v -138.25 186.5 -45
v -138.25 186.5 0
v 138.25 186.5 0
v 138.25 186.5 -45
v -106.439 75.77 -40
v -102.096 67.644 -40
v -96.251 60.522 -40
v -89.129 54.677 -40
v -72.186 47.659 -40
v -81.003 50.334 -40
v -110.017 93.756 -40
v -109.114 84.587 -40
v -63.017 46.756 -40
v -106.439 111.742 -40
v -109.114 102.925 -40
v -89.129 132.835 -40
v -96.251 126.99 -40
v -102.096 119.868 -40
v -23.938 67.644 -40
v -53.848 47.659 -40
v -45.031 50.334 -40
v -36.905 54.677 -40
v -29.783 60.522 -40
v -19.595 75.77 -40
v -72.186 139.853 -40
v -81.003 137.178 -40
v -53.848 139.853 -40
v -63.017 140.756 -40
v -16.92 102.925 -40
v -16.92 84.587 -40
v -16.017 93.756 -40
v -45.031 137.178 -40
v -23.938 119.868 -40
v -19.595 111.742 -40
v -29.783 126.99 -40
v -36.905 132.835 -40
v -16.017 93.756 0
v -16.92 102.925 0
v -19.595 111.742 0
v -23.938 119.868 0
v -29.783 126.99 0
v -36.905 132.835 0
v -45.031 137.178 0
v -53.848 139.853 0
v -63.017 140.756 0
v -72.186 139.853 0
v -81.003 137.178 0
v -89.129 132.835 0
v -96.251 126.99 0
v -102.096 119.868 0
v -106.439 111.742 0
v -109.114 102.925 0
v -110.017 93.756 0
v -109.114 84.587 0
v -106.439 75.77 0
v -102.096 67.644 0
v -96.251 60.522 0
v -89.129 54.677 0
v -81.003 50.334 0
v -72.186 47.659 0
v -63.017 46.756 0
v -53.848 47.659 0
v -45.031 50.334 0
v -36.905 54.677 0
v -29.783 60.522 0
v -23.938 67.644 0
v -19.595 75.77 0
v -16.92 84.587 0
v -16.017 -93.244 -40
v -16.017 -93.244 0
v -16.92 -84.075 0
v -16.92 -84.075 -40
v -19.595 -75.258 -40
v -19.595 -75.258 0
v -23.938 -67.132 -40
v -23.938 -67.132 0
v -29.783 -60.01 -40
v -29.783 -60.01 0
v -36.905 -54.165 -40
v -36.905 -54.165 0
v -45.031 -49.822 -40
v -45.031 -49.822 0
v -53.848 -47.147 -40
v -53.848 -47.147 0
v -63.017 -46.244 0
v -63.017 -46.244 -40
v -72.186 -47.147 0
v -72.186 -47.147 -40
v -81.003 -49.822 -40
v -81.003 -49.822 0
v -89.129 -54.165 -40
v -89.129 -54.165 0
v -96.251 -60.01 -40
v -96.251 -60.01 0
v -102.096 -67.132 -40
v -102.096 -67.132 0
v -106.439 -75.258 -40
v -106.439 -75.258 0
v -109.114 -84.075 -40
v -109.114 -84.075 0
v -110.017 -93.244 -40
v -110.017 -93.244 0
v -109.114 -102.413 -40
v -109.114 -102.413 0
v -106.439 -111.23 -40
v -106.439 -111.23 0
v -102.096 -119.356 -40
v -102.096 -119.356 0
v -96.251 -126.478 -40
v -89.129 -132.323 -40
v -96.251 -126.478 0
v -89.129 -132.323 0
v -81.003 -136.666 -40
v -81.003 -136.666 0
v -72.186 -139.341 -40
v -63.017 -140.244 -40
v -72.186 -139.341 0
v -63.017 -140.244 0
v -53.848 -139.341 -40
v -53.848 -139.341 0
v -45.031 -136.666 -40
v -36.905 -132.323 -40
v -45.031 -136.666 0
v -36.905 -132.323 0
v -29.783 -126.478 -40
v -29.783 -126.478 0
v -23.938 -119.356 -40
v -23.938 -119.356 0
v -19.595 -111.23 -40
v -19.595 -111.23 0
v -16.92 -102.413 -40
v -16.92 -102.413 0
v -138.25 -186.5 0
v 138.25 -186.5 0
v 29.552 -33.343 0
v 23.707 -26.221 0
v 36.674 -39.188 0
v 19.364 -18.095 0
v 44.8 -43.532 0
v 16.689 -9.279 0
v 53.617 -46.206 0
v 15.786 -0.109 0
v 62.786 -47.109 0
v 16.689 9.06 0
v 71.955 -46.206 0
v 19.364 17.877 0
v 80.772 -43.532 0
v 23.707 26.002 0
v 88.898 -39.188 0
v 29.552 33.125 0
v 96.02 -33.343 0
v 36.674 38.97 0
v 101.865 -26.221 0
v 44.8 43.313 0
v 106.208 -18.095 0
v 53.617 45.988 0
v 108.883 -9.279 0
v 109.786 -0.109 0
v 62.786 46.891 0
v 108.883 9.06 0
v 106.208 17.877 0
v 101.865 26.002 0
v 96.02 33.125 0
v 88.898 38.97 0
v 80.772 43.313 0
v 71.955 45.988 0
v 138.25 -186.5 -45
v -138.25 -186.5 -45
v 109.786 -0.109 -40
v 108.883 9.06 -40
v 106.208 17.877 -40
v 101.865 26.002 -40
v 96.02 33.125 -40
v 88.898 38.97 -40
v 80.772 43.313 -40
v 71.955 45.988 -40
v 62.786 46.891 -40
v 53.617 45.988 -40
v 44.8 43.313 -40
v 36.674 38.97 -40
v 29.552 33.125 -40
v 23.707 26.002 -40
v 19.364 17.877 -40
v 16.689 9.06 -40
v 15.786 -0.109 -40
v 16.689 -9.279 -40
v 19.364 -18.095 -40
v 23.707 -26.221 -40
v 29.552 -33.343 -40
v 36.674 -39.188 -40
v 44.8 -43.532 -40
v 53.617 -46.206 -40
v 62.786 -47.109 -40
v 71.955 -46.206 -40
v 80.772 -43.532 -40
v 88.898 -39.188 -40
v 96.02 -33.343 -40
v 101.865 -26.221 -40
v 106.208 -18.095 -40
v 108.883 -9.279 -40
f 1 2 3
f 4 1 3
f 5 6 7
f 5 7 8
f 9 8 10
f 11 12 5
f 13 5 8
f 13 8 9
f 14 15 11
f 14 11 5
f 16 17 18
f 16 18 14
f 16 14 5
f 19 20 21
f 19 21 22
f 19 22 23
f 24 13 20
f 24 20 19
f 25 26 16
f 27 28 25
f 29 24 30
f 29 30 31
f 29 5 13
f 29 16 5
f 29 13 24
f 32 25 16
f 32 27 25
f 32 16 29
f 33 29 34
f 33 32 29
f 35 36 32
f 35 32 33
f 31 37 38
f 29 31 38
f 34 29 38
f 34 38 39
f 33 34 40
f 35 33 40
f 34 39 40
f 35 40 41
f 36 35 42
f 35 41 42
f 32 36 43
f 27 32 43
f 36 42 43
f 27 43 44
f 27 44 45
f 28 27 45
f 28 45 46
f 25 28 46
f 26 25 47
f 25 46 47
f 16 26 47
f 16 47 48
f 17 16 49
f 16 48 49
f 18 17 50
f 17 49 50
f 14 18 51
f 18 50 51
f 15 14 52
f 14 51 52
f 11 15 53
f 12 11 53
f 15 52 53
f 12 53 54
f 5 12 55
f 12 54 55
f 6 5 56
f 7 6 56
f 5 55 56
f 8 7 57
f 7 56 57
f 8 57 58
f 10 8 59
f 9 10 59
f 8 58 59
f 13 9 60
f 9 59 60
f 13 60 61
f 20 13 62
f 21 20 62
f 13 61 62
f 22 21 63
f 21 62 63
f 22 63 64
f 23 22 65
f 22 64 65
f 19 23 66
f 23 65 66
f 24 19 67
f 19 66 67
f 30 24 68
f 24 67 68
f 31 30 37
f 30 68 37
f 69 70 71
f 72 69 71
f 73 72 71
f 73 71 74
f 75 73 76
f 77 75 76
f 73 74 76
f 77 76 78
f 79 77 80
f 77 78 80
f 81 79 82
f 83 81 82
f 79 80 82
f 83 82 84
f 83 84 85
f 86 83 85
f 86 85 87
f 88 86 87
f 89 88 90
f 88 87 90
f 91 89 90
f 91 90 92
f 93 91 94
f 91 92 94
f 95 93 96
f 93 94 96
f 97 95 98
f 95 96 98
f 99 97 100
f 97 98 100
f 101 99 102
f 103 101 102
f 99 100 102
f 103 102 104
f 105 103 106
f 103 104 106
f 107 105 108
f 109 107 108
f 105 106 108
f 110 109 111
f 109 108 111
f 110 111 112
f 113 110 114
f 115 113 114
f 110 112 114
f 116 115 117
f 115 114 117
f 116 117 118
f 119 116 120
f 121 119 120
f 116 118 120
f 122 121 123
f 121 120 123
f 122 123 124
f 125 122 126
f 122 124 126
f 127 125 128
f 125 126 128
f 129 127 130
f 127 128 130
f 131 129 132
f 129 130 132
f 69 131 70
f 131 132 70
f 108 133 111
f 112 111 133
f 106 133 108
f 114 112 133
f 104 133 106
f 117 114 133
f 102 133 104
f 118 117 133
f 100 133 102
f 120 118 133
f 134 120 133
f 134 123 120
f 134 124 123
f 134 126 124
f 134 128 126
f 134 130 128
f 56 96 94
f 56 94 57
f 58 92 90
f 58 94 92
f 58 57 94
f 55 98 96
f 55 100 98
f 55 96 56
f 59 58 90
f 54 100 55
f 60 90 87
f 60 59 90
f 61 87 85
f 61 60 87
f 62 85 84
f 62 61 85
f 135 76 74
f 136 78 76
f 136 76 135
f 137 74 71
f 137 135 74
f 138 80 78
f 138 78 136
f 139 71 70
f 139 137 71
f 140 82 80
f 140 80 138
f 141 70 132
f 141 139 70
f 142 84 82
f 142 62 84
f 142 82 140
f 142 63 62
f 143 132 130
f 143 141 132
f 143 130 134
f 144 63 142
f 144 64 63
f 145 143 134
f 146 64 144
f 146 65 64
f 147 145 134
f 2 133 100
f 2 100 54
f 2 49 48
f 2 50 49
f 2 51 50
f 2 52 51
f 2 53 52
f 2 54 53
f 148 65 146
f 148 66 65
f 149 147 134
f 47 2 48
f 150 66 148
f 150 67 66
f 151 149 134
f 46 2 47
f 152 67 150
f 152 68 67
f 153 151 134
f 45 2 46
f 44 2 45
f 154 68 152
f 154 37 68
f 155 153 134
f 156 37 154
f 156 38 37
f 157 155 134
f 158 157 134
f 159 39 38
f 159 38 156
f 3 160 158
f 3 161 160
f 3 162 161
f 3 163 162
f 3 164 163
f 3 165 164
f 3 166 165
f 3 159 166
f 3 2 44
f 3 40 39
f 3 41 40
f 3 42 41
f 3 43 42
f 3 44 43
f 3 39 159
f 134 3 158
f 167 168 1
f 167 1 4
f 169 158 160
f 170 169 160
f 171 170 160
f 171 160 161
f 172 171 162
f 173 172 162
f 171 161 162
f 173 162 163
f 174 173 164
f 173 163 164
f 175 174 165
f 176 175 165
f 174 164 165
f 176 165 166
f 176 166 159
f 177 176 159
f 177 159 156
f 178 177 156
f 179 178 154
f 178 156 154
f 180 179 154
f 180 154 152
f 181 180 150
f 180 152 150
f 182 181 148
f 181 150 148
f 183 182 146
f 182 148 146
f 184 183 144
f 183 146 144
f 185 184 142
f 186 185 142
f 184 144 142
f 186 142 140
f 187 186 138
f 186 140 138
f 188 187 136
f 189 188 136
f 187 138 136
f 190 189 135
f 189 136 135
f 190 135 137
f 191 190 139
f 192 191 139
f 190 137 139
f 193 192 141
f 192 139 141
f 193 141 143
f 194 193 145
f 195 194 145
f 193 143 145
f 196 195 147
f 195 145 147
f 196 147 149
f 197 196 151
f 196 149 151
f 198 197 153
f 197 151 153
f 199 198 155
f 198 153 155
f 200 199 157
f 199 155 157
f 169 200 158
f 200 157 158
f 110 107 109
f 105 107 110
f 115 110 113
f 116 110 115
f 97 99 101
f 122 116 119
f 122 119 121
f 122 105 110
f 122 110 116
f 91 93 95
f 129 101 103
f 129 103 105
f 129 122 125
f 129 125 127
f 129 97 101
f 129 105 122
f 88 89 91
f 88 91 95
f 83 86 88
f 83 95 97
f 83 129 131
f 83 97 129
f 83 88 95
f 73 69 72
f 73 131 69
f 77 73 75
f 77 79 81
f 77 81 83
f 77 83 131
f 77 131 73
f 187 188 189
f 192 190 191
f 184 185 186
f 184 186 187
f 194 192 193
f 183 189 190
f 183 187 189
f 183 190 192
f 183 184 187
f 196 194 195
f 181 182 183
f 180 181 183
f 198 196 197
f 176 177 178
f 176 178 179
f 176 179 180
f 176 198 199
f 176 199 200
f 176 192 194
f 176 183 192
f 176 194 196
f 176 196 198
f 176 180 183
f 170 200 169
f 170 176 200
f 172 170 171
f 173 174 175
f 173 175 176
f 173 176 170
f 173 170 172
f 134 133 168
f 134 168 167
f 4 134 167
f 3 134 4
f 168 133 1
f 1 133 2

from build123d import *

# Parameters (mm, degrees)
F0_W     = 276.5
F0_H     = 373
F2_DEPTH = 45
F1_R     = 47
F3_DEPTH = 40


with BuildPart() as f2:
    # F0 (on Top) → F2 (new body)
    with BuildSketch(Plane.XY):
        Rectangle(F0_W, F0_H)
    extrude(amount=-F2_DEPTH)

    # F1 (on face) → F3 (cut)
    with BuildSketch(Plane.XY):
        with Locations((-63.016894, 93.755925)):
            Circle(F1_R)
        with Locations((62.786135, -0.109312)):
            Circle(F1_R)
        with Locations((-63.016894, -93.244075)):
            Circle(F1_R)
    extrude(amount=-F3_DEPTH, mode=Mode.SUBTRACT)


solid = f2.part
